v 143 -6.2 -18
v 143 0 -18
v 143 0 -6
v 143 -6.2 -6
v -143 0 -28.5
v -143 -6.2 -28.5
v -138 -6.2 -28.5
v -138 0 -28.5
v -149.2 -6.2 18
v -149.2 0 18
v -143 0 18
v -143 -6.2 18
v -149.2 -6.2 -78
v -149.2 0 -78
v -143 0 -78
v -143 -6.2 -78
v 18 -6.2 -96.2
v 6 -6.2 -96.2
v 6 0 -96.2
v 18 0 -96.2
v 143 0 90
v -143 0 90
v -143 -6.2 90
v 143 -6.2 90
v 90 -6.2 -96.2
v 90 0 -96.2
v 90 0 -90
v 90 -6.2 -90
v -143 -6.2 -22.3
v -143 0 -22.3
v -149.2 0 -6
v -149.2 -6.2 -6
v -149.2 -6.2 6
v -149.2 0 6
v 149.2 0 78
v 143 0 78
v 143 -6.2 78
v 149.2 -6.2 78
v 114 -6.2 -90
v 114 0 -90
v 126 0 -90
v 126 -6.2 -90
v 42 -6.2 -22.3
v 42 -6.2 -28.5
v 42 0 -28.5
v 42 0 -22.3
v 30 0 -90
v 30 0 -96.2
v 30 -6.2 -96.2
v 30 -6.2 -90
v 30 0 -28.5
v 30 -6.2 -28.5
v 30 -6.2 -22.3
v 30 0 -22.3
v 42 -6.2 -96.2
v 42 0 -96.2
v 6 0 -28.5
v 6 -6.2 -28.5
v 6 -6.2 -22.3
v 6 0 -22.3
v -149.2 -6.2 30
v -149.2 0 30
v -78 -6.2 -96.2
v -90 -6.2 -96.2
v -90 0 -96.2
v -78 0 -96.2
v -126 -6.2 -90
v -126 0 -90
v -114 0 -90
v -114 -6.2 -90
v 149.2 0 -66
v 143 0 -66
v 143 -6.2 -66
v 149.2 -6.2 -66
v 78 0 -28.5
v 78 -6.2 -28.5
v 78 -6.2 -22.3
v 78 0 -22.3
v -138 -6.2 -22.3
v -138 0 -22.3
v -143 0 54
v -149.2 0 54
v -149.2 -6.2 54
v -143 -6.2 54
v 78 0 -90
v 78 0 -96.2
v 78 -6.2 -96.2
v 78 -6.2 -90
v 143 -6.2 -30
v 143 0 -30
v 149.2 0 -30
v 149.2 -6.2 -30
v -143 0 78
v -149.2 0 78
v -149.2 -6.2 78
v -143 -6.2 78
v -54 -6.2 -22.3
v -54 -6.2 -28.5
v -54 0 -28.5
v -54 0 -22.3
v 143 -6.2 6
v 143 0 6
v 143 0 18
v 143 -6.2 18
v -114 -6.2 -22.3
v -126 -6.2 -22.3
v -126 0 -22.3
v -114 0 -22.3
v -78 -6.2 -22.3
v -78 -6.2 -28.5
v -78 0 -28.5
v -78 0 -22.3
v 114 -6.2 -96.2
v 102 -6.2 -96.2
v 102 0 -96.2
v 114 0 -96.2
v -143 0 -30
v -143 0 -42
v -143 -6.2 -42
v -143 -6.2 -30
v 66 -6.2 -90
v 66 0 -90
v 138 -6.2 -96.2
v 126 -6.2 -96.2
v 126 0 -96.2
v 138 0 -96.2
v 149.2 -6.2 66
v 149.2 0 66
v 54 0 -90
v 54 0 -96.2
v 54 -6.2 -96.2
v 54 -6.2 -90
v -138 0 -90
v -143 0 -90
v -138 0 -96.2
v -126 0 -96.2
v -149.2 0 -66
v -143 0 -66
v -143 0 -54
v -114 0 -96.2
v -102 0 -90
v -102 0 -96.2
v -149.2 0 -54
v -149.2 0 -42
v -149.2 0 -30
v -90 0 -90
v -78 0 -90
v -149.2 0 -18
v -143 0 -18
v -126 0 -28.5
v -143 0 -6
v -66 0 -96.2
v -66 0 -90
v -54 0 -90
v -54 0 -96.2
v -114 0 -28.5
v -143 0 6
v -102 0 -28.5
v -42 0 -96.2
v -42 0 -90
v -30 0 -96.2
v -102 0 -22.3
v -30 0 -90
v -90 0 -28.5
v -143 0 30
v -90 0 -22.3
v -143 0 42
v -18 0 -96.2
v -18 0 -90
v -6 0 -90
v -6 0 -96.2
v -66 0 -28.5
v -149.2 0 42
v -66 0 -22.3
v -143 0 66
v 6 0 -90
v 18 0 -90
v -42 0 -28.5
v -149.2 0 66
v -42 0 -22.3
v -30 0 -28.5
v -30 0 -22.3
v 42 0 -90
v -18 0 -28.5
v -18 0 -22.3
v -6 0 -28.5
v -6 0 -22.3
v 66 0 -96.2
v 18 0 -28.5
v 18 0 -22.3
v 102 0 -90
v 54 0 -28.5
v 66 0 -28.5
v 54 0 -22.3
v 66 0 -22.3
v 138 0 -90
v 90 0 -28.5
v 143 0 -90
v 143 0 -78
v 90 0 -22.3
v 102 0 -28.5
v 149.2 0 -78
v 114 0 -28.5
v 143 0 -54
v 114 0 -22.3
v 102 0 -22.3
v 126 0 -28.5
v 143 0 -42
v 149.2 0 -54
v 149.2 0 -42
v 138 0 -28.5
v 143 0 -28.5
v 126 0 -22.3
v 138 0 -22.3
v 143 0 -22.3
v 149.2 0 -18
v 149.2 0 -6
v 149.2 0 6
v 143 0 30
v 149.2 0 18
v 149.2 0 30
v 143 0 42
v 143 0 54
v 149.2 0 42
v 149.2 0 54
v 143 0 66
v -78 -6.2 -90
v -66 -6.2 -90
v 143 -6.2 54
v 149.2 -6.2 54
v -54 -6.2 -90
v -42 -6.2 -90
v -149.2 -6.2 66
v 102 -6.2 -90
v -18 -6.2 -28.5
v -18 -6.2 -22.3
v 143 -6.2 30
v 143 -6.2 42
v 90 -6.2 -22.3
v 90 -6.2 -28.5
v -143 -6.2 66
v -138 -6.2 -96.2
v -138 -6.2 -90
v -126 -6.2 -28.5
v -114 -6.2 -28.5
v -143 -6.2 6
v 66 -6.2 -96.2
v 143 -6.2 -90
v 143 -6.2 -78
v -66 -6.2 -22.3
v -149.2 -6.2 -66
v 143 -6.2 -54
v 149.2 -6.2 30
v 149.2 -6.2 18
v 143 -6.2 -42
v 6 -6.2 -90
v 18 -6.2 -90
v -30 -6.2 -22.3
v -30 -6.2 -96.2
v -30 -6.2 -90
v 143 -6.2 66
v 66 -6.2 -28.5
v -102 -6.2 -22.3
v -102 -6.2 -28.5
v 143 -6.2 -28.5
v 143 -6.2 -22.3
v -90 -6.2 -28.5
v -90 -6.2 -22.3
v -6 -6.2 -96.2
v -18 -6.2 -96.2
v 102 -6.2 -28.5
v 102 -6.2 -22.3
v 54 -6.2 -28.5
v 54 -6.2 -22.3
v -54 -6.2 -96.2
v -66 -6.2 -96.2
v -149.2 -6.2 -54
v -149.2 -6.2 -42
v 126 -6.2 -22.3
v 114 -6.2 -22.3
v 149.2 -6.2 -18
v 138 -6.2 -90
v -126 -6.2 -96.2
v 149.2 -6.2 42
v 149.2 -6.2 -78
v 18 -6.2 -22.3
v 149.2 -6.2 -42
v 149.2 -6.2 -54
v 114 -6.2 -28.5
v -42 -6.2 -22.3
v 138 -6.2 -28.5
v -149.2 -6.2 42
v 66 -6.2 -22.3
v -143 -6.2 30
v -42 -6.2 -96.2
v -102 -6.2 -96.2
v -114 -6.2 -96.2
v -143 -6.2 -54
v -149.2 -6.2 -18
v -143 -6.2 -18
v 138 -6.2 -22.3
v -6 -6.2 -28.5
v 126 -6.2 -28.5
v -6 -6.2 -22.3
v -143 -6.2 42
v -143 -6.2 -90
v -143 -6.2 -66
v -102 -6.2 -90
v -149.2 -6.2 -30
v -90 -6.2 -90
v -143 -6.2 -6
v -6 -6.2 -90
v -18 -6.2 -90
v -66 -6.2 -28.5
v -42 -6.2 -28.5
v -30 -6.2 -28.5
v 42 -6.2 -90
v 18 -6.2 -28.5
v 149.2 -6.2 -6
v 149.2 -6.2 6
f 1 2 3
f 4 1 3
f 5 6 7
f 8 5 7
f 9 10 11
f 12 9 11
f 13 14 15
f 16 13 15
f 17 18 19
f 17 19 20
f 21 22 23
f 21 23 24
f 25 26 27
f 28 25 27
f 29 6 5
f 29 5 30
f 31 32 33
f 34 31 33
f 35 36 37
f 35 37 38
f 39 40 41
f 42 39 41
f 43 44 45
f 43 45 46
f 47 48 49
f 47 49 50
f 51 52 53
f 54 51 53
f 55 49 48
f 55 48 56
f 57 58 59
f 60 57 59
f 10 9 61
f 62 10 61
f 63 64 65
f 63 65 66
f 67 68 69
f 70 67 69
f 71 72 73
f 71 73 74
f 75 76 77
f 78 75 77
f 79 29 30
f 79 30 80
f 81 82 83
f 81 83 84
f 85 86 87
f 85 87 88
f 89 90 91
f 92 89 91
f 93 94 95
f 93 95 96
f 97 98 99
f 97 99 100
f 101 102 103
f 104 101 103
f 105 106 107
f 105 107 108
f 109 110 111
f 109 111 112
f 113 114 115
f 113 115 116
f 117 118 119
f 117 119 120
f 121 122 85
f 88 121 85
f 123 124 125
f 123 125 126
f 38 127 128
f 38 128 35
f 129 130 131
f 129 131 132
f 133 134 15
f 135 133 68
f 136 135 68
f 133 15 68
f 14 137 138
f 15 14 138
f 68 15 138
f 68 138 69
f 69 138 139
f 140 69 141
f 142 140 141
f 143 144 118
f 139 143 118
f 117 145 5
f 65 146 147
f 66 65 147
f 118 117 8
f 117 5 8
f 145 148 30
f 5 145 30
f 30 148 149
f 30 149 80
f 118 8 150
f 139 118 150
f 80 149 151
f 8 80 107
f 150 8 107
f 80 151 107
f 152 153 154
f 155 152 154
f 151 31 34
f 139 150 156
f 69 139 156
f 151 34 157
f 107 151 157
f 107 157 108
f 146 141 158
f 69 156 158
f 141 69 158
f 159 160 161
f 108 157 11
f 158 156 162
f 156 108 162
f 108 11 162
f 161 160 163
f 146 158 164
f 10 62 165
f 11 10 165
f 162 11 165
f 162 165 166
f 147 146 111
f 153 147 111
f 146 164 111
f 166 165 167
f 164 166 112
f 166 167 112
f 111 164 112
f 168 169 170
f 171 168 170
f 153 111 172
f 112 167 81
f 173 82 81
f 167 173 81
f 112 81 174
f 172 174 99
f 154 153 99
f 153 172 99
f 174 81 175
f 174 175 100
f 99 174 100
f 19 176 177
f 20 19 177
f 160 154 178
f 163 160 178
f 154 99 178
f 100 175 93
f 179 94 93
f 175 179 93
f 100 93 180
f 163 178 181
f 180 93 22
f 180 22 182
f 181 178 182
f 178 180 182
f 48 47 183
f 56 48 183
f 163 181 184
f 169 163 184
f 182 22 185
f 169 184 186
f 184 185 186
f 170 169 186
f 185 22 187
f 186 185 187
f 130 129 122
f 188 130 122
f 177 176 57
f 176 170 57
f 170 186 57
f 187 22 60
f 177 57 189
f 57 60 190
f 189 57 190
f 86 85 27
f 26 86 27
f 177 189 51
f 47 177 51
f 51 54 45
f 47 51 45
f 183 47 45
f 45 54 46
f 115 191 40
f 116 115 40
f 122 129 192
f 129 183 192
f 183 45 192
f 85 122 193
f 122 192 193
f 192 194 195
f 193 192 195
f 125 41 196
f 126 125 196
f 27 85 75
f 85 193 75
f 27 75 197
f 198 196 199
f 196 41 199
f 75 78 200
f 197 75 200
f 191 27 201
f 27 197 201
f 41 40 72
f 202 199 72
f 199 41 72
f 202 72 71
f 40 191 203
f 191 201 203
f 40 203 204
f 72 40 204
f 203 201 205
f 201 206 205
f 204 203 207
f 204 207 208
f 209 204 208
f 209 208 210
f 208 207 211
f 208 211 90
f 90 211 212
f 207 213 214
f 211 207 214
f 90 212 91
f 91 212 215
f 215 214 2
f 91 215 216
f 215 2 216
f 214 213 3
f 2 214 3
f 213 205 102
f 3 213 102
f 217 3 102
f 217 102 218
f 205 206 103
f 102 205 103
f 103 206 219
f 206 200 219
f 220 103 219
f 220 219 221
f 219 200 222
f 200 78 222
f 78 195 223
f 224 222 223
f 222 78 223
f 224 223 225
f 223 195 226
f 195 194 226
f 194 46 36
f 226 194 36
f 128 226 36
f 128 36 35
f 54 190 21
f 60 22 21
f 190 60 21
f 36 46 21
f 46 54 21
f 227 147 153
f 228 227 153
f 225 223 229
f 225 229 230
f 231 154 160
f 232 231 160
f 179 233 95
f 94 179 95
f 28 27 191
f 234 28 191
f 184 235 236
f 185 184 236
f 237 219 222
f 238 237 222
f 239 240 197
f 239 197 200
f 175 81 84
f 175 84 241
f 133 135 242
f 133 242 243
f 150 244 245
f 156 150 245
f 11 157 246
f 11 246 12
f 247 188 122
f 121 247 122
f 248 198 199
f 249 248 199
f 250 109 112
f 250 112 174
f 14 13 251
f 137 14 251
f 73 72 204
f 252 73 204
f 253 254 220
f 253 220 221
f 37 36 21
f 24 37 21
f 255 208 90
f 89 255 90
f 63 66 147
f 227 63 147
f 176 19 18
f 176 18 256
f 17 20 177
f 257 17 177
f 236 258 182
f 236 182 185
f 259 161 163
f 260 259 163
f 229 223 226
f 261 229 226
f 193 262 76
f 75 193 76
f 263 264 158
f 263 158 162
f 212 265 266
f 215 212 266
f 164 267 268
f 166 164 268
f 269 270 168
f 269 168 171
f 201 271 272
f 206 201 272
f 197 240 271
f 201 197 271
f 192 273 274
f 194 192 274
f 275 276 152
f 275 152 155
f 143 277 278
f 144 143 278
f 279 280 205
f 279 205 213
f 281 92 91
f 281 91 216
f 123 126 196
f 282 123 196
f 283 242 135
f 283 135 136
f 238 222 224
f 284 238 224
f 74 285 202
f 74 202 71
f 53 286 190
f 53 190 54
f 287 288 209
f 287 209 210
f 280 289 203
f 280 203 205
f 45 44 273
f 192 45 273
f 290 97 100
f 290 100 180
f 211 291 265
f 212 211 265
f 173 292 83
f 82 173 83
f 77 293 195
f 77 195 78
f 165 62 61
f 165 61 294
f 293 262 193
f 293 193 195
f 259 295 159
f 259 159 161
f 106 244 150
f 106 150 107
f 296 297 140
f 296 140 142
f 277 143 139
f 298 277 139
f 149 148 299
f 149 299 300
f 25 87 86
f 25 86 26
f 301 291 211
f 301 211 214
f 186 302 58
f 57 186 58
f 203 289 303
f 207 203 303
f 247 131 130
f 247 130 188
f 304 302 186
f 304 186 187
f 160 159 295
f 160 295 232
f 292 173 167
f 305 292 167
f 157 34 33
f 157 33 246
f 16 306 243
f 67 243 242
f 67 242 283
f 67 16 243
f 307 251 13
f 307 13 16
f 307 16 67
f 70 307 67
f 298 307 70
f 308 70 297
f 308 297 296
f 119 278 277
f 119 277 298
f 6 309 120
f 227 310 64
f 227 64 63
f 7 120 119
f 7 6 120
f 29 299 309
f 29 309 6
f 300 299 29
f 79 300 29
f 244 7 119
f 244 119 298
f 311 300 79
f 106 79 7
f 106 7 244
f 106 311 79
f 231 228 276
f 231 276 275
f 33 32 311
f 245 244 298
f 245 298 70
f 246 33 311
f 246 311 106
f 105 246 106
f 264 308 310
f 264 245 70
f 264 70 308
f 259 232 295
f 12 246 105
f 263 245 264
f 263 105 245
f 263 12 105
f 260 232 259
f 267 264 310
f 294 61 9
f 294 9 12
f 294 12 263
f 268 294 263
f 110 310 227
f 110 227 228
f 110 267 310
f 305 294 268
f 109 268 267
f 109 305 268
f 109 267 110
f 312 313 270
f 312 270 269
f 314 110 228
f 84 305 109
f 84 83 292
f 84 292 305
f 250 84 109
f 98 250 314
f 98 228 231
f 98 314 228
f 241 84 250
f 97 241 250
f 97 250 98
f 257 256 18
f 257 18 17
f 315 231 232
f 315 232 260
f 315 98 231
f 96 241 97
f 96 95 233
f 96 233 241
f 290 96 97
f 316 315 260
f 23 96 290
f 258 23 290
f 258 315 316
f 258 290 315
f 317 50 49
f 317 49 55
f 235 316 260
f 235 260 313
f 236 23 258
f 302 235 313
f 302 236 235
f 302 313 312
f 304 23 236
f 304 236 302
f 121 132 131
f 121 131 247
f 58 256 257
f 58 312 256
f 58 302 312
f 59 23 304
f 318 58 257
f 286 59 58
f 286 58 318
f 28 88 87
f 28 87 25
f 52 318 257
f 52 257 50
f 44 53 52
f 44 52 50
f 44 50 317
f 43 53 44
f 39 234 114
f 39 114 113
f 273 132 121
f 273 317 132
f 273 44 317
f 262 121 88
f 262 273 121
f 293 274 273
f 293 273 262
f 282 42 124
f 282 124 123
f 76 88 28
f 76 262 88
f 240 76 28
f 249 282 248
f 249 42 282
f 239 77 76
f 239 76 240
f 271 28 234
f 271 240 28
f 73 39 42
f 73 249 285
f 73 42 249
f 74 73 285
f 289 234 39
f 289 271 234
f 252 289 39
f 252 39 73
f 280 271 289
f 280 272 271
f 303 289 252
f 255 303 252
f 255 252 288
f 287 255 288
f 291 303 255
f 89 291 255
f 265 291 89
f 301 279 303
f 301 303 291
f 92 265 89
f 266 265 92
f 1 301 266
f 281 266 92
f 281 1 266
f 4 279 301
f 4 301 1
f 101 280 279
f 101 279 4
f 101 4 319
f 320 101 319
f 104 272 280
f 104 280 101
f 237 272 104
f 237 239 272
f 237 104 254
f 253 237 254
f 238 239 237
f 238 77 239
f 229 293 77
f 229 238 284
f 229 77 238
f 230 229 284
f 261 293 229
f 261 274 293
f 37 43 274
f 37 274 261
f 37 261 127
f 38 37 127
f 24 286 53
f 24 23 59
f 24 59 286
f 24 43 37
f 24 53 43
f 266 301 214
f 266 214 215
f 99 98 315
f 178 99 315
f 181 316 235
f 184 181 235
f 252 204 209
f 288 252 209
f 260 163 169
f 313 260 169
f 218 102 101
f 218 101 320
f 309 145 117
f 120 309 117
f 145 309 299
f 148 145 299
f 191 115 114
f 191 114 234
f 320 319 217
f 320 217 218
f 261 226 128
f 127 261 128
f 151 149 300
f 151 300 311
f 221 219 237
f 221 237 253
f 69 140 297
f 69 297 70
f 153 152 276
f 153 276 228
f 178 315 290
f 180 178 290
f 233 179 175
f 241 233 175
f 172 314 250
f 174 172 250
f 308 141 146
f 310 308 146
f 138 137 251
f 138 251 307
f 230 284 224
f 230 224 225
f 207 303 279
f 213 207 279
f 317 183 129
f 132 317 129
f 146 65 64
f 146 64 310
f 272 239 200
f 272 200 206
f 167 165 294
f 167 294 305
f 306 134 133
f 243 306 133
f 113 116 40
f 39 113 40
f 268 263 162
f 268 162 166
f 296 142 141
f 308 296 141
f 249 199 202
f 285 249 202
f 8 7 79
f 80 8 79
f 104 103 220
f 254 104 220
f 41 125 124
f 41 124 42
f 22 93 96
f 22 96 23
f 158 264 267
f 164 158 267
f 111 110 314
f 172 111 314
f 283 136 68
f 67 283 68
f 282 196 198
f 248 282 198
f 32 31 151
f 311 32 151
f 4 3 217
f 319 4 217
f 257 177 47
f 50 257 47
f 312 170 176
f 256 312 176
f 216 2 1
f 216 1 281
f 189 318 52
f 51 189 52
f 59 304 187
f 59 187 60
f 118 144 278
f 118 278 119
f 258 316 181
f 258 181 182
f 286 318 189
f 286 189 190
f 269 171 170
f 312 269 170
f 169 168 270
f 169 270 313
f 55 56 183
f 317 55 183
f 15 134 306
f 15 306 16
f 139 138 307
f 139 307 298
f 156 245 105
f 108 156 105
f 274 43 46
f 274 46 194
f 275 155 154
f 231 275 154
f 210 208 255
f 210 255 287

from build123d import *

# Parameters (mm, degrees)
F0_W     = 286
F0_H     = 180
F1_DEPTH = 6.2
F2_W     = 12
F2_H     = 6.2
F2_W_2   = 5
F3_DEPTH = 6.201
F4_W     = 12
F4_H     = 6.2
F5_DEPTH = 6.2
F6_W     = 6.2
F6_H     = 12
F7_DEPTH = 6.2


with BuildPart() as f1:
    # F0 (on Front) → F1 (new body)
    with BuildSketch(Plane.XZ):
        Rectangle(F0_W, F0_H)
    extrude(amount=F1_DEPTH)

    # F2 (on face) → F3 (cut, through all)
    with BuildSketch(Plane.XZ.offset(6.2)):
        with Locations((-120, -25.4)):
            Rectangle(F2_W, F2_H)
        with Locations((-96, -25.4)):
            Rectangle(F2_W, F2_H)
        with Locations((-72, -25.4)):
            Rectangle(F2_W, F2_H)
        with Locations((-48, -25.4)):
            Rectangle(F2_W, F2_H)
        with Locations((-24, -25.4)):
            Rectangle(F2_W, F2_H)
        with Locations((0, -25.4)):
            Rectangle(F2_W, F2_H)
        with Locations((24, -25.4)):
            Rectangle(F2_W, F2_H)
        with Locations((48, -25.4)):
            Rectangle(F2_W, F2_H)
        with Locations((72, -25.4)):
            Rectangle(F2_W, F2_H)
        with Locations((96, -25.4)):
            Rectangle(F2_W, F2_H)
        with Locations((120, -25.4)):
            Rectangle(F2_W, F2_H)
        with Locations((-140.5, -25.4)):
            Rectangle(F2_W_2, F2_H)
        with Locations((140.5, -25.4)):
            Rectangle(F2_W_2, F2_H)
    extrude(amount=-F3_DEPTH, mode=Mode.SUBTRACT)

    # F4 (on face) → F5 (join, through all)
    with BuildSketch(Plane.XZ.offset(6.2)):
        with Locations((-132, -93.1)):
            Rectangle(F4_W, F4_H)
        with Locations((-108, -93.1)):
            Rectangle(F4_W, F4_H)
        with Locations((-84, -93.1)):
            Rectangle(F4_W, F4_H)
        with Locations((-60, -93.1)):
            Rectangle(F4_W, F4_H)
        with Locations((-36, -93.1)):
            Rectangle(F4_W, F4_H)
        with Locations((-12, -93.1)):
            Rectangle(F4_W, F4_H)
        with Locations((12, -93.1)):
            Rectangle(F4_W, F4_H)
        with Locations((36, -93.1)):
            Rectangle(F4_W, F4_H)
        with Locations((60, -93.1)):
            Rectangle(F4_W, F4_H)
        with Locations((84, -93.1)):
            Rectangle(F4_W, F4_H)
        with Locations((108, -93.1)):
            Rectangle(F4_W, F4_H)
        with Locations((132, -93.1)):
            Rectangle(F4_W, F4_H)
    extrude(amount=-F5_DEPTH)

    # F6 (on face) → F7 (join)
    with BuildSketch(Plane.XZ.offset(6.2)):
        with Locations((-146.1, 0)):
            Rectangle(F6_W, F6_H)
        with Locations((-146.1, 24)):
            Rectangle(F6_W, F6_H)
        with Locations((-146.1, 48)):
            Rectangle(F6_W, F6_H)
        with Locations((-146.1, 72)):
            Rectangle(F6_W, F6_H)
        with Locations((-146.1, -24)):
            Rectangle(F6_W, F6_H)
        with Locations((-146.1, -48)):
            Rectangle(F6_W, F6_H)
        with Locations((-146.1, -72)):
            Rectangle(F6_W, F6_H)
        with Locations((146.1, 0)):
            Rectangle(F6_W, F6_H)
        with Locations((146.1, 24)):
            Rectangle(F6_W, F6_H)
        with Locations((146.1, -24)):
            Rectangle(F6_W, F6_H)
        with Locations((146.1, -72)):
            Rectangle(F6_W, F6_H)
        with Locations((146.1, -48)):
            Rectangle(F6_W, F6_H)
        with Locations((146.1, 72)):
            Rectangle(F6_W, F6_H)
        with Locations((146.1, 48)):
            Rectangle(F6_W, F6_H)
    extrude(amount=-F7_DEPTH)


solid = f1.part
